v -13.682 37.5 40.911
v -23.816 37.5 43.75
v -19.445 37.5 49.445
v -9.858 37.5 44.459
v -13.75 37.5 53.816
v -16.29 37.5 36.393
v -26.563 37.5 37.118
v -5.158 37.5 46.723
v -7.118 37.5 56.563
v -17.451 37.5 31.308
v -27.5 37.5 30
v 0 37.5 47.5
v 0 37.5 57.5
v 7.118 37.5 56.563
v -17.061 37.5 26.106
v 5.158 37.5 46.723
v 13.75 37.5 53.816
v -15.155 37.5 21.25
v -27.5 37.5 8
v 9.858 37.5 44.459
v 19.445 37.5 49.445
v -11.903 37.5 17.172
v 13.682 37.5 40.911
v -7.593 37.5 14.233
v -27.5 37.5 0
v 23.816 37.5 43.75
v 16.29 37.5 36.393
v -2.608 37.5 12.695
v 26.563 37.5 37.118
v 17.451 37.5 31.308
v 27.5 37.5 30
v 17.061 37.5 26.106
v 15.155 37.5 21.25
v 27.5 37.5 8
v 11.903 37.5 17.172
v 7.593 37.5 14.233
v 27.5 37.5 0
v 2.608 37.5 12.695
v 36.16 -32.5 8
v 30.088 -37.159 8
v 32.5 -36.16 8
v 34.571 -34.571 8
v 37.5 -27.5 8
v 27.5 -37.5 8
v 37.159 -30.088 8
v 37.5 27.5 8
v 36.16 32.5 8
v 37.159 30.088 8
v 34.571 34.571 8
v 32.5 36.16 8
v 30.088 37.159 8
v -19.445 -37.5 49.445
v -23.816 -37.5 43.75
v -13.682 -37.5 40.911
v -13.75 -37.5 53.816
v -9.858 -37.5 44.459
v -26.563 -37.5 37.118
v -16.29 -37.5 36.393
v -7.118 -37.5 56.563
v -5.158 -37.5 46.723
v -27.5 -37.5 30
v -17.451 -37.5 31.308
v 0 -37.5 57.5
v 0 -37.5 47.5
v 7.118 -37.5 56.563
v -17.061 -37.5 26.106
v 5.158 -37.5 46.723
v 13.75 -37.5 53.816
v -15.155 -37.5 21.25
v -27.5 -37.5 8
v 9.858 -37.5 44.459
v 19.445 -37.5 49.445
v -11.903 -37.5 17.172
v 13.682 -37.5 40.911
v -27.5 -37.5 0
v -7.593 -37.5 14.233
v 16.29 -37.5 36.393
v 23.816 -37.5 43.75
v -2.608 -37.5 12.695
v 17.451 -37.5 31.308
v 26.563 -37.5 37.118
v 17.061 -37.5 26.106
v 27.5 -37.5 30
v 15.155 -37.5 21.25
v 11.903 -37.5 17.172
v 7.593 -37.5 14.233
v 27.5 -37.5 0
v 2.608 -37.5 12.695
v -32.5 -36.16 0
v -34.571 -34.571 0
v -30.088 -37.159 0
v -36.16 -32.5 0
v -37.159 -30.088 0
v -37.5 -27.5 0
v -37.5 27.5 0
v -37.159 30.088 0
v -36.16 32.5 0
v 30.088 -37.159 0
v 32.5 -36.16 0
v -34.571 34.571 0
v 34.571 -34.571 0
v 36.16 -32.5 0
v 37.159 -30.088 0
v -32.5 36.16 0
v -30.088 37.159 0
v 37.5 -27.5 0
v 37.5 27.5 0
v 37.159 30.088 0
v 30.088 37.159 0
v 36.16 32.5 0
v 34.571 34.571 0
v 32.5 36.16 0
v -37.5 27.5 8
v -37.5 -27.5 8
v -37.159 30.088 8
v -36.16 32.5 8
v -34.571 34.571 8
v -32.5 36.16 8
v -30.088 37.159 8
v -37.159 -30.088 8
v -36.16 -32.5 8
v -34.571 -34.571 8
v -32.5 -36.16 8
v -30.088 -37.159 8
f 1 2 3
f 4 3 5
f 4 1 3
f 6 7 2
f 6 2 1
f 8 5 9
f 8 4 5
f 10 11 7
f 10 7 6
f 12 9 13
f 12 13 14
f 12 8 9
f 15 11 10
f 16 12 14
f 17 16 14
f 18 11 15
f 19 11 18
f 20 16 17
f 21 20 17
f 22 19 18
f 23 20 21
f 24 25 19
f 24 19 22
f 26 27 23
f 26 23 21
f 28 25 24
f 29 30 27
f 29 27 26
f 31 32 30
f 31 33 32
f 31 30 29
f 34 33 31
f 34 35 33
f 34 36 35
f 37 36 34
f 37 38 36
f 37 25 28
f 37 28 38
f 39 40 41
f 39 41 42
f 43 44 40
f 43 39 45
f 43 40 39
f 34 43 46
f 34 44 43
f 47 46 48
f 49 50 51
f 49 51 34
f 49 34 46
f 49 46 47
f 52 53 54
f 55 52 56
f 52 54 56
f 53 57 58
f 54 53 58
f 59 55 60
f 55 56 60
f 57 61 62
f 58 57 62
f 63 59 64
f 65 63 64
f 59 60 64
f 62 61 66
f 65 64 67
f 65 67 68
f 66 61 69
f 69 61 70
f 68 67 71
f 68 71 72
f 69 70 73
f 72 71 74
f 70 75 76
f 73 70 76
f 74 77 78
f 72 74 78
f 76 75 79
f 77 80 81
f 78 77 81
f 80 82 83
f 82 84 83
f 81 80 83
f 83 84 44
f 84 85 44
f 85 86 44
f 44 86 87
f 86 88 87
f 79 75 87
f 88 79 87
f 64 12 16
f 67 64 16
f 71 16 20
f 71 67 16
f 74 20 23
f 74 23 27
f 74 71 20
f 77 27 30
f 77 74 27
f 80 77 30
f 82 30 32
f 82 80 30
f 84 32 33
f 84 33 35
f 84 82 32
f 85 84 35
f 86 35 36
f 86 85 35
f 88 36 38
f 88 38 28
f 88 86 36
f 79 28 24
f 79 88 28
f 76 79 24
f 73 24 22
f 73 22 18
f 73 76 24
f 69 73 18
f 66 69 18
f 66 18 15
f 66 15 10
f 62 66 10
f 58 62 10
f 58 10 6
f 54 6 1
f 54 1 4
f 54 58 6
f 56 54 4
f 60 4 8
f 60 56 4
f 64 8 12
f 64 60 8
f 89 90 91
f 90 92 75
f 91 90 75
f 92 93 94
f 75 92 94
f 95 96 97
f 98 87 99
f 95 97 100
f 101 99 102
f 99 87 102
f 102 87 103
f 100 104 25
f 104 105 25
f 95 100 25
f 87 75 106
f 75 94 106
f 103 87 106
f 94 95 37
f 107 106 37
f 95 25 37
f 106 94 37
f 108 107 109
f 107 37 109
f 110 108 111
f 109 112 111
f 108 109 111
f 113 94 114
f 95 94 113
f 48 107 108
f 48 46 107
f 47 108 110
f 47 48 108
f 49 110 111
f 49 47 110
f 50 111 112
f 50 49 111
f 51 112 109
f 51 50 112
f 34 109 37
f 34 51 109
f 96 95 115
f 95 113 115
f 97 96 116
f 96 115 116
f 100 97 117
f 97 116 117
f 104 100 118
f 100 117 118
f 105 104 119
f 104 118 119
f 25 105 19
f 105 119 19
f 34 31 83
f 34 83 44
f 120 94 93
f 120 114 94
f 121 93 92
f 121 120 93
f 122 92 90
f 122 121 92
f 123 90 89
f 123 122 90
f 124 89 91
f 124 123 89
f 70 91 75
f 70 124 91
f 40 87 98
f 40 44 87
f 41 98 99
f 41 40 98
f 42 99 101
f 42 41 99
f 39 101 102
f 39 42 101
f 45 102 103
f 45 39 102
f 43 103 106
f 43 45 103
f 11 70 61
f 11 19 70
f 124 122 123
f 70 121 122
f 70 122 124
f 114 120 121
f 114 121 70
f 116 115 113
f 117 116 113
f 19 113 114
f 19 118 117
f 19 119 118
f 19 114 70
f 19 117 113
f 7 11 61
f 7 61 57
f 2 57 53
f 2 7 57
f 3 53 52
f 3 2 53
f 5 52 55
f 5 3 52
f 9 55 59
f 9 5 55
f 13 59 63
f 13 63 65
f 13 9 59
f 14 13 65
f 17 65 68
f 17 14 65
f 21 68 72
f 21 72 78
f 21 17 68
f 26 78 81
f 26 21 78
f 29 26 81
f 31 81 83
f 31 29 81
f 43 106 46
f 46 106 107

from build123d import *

# Parameters (mm, degrees)
SKETCH1_W               = 75
SKETCH1_H               = 75
BOSS_EXTRUDE1_DEPTH     = 8
FILLET1_R               = 10
SKETCH2_R               = 17.5
BOSS_EXTRUDE2_DEPTH     = 37.5
SKETCH3_R               = 17
BOSS_EXTRUDE3_DEPTH     = 200
SKETCH4_R               = 22
SKETCH4_R_2             = 17
BOSS_EXTRUDE4_DEPTH     = 10
BOSS_EXTRUDE5_DEPTH     = 50
SKETCH6_R               = 17.5
CUT_EXTRUDE1_DEPTH      = 25
SKETCH7_R               = 17.5
BOSS_EXTRUDE6_DEPTH     = 100
CUT_EXTRUDE2_DEPTH      = 235.438691346
CUT_EXTRUDE2_DEPTH_BACK = 235.438691346
SKETCH8_R               = 5.5
CUT_EXTRUDE3_DEPTH      = 258.012159245
CUT_EXTRUDE3_DEPTH_BACK = 258.012159245
SKETCH10_R              = 14
CHAMFER1_SIZE           = 5
CUT_EXTRUDE4_DEPTH      = 12
FILLET3_R               = 3
FILLET2_R               = 3


with BuildPart() as part:
    # Sketch1 → Boss-Extrude1 (new body)
    with BuildSketch(Plane.XY):
        Rectangle(SKETCH1_W, SKETCH1_H)
    extrude(amount=BOSS_EXTRUDE1_DEPTH)

    # Fillet1
    fillet1_edges = [part.edges().sort_by_distance(p)[0] for p in [
        (37.5, -37.5, 4),
        (-37.5, -37.5, 4),
        (-37.5, 37.5, 4),
        (37.5, 37.5, 4),
    ]]
    fillet(fillet1_edges, radius=FILLET1_R)

    # Sketch2 → Boss-Extrude2 (add, symmetric)
    with BuildSketch(Plane(origin=(0, 0, 0), x_dir=(1, 0, 0), z_dir=(0, 1, 0))):
        with BuildLine():
            Line((-27.5, -8), (-27.5, -30))
            ThreePointArc((-27.5, -30), (0, -57.5), (27.5, -30))
            Line((27.5, -30), (27.5, -8))
            Line((27.5, -8), (-27.5, -8))
        make_face()
        with Locations(Location((0, -30, 0), (0, 0, 270))):
            Circle(SKETCH2_R, mode=Mode.SUBTRACT)
    extrude(amount=BOSS_EXTRUDE2_DEPTH, both=True)


with BuildPart() as body_2:
    # Sketch3 → Boss-Extrude3 (new body)
    with BuildSketch(Plane(origin=(0, 37.5, 0), x_dir=(1, 0, 0), z_dir=(0, 1, 0))):
        with Locations(Location((0, -30, 0), (0, 0, 270))):
            Circle(SKETCH3_R)
    extrude(amount=-BOSS_EXTRUDE3_DEPTH)

    # Sketch4 → Boss-Extrude4 (add)
    with BuildSketch(Plane.XZ.offset(37.5)):
        with Locations(Location((0, 30, 0), (0, 0, 270))):
            Circle(SKETCH4_R)
        with Locations(Location((0, 30, 0), (0, 0, 90))):
            Circle(SKETCH4_R_2, mode=Mode.SUBTRACT)
    extrude(amount=BOSS_EXTRUDE4_DEPTH)


with BuildPart() as body_3:
    # Sketch5 → Boss-Extrude5 (new body)
    with BuildSketch(Plane.XZ.offset(162.5)):
        with BuildLine():
            Line((-8, 15), (-8, 5))
            Line((-8, 5), (-12.5, 5))
            Line((-12.5, 5), (-25, 17.5))
            Line((-25, 17.5), (-25, 82))
            Line((-25, 82), (0, 82))
            Line((0, 82), (0, 47))
            ThreePointArc((0, 47), (-16.492422502, 34.123105626), (-8, 15))
        make_face()
    extrude(amount=-BOSS_EXTRUDE5_DEPTH)

    # Mirror1: body 3 across plane


with BuildPart() as body_3_1:
    add(body_3.part)
    add(body_3.part.mirror(Plane(origin=(0, -112.5, 82), x_dir=(0, 0, 1), z_dir=(1, 0, 0))))

    # Sketch6 → Cut-Extrude1 (cut)
    with BuildSketch(Plane.XY.offset(82)):
        with Locations((0, -137.5)):
            Circle(SKETCH6_R)
    extrude(amount=-CUT_EXTRUDE1_DEPTH, mode=Mode.SUBTRACT)


with BuildPart() as body_4:
    # Sketch7 → Boss-Extrude6 (new body)
    with BuildSketch(Plane.XY.offset(57)):
        with Locations((0, -137.5)):
            Circle(SKETCH7_R)
    extrude(amount=BOSS_EXTRUDE6_DEPTH)


with BuildPart() as cut_extrude2_tool:
    # Sketch8 → Cut-Extrude2 (new, two sides: drawn at the far end of the back side and taken through both)
    with BuildSketch(Plane(origin=(25, 0, 0), x_dir=(0, 0, -1), z_dir=(1, 0, 0)).offset(-CUT_EXTRUDE2_DEPTH_BACK)):
        with Locations((-30, -137.5)):
            Circle(SKETCH8_R)
    extrude(amount=CUT_EXTRUDE2_DEPTH + CUT_EXTRUDE2_DEPTH_BACK)


with BuildPart() as body_2_1:
    add(body_2.part)

    # Cut-Extrude2: cut by cut_extrude2_tool
    add(cut_extrude2_tool.part, mode=Mode.SUBTRACT)

    # Sketch10 → Cut-Extrude3 (cut, two sides: drawn at the far end of the back side and taken through both)
    with BuildSketch(Plane.XZ.offset(162.5).offset(-CUT_EXTRUDE3_DEPTH_BACK)):
        with Locations(Location((0, 30, 0), (0, 0, 270))):
            Circle(SKETCH10_R)
    extrude(amount=CUT_EXTRUDE3_DEPTH + CUT_EXTRUDE3_DEPTH_BACK, mode=Mode.SUBTRACT)


with BuildPart() as body_3_2:
    add(body_3_1.part)

    # Cut-Extrude2: cut by cut_extrude2_tool
    add(cut_extrude2_tool.part, mode=Mode.SUBTRACT)

    # Chamfer1
    chamfer1_edges = [body_3_2.edges().sort_by_distance(p)[0] for p in [
        (25, -137.5, 35.5),
    ]]
    chamfer(chamfer1_edges, length=CHAMFER1_SIZE)

    # Sketch11 → Cut-Extrude4 (cut)
    with BuildSketch(Plane.ZY.offset(25)):
        Polygon((39, -142.696152423), (39, -132.303847577), (30, -127.107695155), (21, -132.303847577), (21, -142.696152423), (30, -147.892304845), align=None)
    extrude(amount=-CUT_EXTRUDE4_DEPTH, mode=Mode.SUBTRACT)

    # Fillet3
    fillet3_edges = [body_3_2.edges().sort_by_distance(p)[0] for p in [
        (-8, -137.5, 5),
        (-12.5, -137.5, 5),
        (-25, -137.5, 17.5),
        (8, -137.5, 5),
        (12.5, -137.5, 5),
        (25, -137.5, 17.5),
    ]]
    fillet(fillet3_edges, radius=FILLET3_R)

    # Fillet2
    fillet2_edges = [body_3_2.edges().sort_by_distance(p)[0] for p in [
        (12.40540961, -162.5, 5.228361402),
        (-12.40540961, -162.5, 5.228361402),
        (-11.128679656, -112.5, 5),
        (-8, -112.5, 11.5),
        (18.75, -112.5, 11.25),
        (11.128679656, -112.5, 5),
        (8, -112.5, 11.5),
        (-24.771638598, -112.5, 17.59459039),
        (24.771638598, -112.5, 17.59459039),
        (-8.878679656, -112.5, 5.878679656),
        (8.878679656, -112.5, 5.878679656),
        (12.40540961, -112.5, 5.228361402),
        (-12.40540961, -112.5, 5.228361402),
        (-25, -112.5, 50.371320344),
        (25, -162.5, 50.371320344),
        (25, -112.5, 50.371320344),
        (-25, -162.5, 50.371320344),
        (-18.75, -162.5, 11.25),
        (-18.75, -112.5, 11.25),
        (8, -162.5, 11.5),
        (11.128679656, -162.5, 5),
        (18.75, -162.5, 11.25),
        (-11.128679656, -162.5, 5),
        (-8, -162.5, 11.5),
        (-24.771638598, -162.5, 17.59459039),
        (24.771638598, -162.5, 17.59459039),
        (-8.878679656, -162.5, 5.878679656),
        (8.878679656, -162.5, 5.878679656),
    ]]
    fillet(fillet2_edges, radius=FILLET2_R)


solid = part.part
